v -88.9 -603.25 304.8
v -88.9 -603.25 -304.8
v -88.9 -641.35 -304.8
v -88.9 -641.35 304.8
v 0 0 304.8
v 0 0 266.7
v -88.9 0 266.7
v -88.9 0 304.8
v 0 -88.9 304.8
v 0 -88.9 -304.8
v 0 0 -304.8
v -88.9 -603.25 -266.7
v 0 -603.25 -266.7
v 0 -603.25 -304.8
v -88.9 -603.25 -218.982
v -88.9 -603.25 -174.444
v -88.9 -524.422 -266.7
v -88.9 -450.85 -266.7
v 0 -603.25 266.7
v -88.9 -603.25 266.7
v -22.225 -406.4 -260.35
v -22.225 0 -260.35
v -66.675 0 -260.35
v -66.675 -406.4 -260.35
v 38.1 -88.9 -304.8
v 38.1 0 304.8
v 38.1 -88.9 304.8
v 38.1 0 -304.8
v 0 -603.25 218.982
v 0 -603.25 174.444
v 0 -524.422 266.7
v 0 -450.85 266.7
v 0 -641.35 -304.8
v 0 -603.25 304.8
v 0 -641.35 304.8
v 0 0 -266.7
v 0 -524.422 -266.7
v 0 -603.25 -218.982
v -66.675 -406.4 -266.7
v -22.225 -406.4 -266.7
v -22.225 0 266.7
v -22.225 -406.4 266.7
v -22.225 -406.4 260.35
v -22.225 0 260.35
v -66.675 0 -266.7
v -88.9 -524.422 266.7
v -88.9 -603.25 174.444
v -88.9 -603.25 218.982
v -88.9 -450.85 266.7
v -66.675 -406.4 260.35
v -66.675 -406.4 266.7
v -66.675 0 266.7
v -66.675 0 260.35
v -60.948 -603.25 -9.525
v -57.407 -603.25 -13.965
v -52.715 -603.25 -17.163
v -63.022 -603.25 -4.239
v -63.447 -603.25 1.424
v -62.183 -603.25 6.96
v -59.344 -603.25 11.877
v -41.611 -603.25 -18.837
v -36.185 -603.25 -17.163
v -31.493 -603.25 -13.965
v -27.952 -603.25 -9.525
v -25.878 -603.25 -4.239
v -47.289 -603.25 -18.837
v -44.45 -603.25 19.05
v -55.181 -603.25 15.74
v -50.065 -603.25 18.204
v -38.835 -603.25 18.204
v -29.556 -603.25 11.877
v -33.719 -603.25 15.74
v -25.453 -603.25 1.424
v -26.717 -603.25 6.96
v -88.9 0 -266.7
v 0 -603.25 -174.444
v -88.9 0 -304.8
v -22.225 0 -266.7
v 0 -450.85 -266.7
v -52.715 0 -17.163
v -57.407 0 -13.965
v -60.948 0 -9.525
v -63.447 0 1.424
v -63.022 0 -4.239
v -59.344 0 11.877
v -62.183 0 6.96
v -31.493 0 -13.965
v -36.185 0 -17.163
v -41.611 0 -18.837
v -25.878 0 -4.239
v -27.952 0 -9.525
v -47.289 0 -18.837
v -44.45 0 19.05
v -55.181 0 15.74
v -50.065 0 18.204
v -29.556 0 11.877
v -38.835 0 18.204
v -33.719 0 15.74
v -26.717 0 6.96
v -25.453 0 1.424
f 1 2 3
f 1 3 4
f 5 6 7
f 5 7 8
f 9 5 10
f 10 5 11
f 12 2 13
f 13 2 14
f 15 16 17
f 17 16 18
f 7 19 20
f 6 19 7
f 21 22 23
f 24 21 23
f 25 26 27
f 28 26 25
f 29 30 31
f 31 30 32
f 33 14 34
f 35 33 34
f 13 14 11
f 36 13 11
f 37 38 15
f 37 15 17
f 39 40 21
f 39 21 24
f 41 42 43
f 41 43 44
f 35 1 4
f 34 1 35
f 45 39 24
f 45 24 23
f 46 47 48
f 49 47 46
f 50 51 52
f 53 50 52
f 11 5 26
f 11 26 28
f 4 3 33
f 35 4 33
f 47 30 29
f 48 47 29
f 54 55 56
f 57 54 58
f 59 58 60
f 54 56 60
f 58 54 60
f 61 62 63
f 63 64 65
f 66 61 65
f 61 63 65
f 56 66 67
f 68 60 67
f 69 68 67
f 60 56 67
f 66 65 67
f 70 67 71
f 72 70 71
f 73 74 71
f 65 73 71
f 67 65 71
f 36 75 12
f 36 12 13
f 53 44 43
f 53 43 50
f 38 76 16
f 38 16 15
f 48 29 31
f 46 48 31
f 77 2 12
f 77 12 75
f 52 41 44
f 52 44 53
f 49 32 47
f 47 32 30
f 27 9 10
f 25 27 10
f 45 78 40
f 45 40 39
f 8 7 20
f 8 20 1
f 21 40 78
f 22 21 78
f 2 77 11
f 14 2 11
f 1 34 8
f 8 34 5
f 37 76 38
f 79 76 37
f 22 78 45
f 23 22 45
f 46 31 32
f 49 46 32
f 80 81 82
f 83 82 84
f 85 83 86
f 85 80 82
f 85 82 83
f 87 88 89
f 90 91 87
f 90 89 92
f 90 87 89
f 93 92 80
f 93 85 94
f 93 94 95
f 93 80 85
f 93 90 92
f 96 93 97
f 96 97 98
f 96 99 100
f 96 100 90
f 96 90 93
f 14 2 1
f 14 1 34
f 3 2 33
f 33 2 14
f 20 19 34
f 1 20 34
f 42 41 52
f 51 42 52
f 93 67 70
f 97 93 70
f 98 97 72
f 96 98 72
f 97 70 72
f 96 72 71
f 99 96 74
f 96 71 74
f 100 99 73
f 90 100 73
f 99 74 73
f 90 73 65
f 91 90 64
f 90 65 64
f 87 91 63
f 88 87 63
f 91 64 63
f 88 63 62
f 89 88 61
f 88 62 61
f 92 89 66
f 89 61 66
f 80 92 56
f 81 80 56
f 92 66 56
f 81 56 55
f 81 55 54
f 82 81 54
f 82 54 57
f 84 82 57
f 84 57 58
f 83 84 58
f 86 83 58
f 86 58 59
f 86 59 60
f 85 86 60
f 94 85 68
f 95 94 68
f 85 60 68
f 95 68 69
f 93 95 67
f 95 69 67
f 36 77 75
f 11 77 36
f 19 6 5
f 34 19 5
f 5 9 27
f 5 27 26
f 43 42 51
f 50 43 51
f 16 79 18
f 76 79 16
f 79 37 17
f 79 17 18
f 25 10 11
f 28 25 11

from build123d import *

# Parameters (mm, degrees)
SKETCH1_W                  = 609.6
SKETCH1_H                  = 88.9
TOP_CROSS_SUPPORT_DEPTH    = 38.1
SKETCH2_W                  = 38.1
SKETCH2_H                  = 603.25
LEG_DEPTH                  = 88.9
SKETCH7_W                  = 44.45
SKETCH7_H                  = 406.4
SLIDER_GUIDE_DEPTH         = 6.35
LEG_MIRROR_START           = -304.8
LEG_MIRROR_OUTLINE_W       = 88.9
LEG_MIRROR_OUTLINE_H       = 603.25
LEG_MIRROR_DEPTH           = 38.1
SKETCH4_W                  = 88.9
SKETCH4_H                  = 609.6
BOTTOM_CROSS_SUPPORT_DEPTH = 38.1
LOW_DIAGONAL_SUPPORT_DEPTH = 88.9
SKETCH6_R                  = 19.05
ACTUATOR_DEPTH             = 603.25


# Read off the part's stored shape, not the designer's step: Leg_Mirror
with BuildPart() as part:
    # Sketch1 → Top_Cross_Support (new body)
    with BuildSketch(Plane(origin=(0, 0, 0), x_dir=(0, 0, -1), z_dir=(1, 0, 0))):
        with Locations((0, -44.45)):
            Rectangle(SKETCH1_W, SKETCH1_H)
    extrude(amount=TOP_CROSS_SUPPORT_DEPTH)


with BuildPart() as body_2:
    # Sketch2 → Leg (new body)
    with BuildSketch(Plane.ZY):
        with Locations((285.75, -301.625)):
            Rectangle(SKETCH2_W, SKETCH2_H)
    extrude(amount=LEG_DEPTH)


with BuildPart() as body_3:
    # Sketch7 → Slider_Guide (new body)
    with BuildSketch(Plane(origin=(0, 0, 266.7), x_dir=(-1, 0, 0), z_dir=(0, 0, -1))):
        with Locations((44.45, -203.2)):
            Rectangle(SKETCH7_W, SKETCH7_H)
    extrude(amount=SLIDER_GUIDE_DEPTH)


with BuildPart() as body_4:
    # Leg_Mirror outline → Leg_Mirror (new body)
    with BuildSketch(Plane.XY.offset(LEG_MIRROR_START)):
        with Locations((-44.45, -301.625)):
            Rectangle(LEG_MIRROR_OUTLINE_W, LEG_MIRROR_OUTLINE_H)
    extrude(amount=LEG_MIRROR_DEPTH)


with BuildPart() as body_5:
    # Sketch4 → Bottom_Cross_Support (new body)
    with BuildSketch(Plane.XZ.offset(603.25)):
        with Locations((-44.45, 0)):
            Rectangle(SKETCH4_W, SKETCH4_H)
    extrude(amount=BOTTOM_CROSS_SUPPORT_DEPTH)


with BuildPart() as body_6:
    # Sketch5 → Low_Diagonal_Support (new body)
    with BuildSketch(Plane(origin=(0, 0, 0), x_dir=(0, 0, -1), z_dir=(1, 0, 0))):
        Polygon((-218.981536726, -603.25), (-266.7, -524.422298286), (-266.7, -450.85), (-174.444439521, -603.25), align=None)
    extrude(amount=-LOW_DIAGONAL_SUPPORT_DEPTH)


with BuildPart() as body_7:
    # Low_Diagonal_Support_Mirror: mirrored copy
    add(body_6.part.mirror(Plane.XY))


with BuildPart() as body_8:
    # Sketch6 → Actuator (new body)
    with BuildSketch(Plane(origin=(0, -603.25, 0), x_dir=(1, 0, 0), z_dir=(0, 1, 0))):
        with Locations(Location((-44.45, 0, 0), (0, 0, 270))):
            Circle(SKETCH6_R)
    extrude(amount=ACTUATOR_DEPTH)


with BuildPart() as body_9:
    # Mirror2: mirrored copy
    add(body_3.part.mirror(Plane.XY))


solid = Compound([part.part, body_2.part, body_3.part, body_4.part, body_5.part, body_6.part, body_7.part, body_8.part, body_9.part])
